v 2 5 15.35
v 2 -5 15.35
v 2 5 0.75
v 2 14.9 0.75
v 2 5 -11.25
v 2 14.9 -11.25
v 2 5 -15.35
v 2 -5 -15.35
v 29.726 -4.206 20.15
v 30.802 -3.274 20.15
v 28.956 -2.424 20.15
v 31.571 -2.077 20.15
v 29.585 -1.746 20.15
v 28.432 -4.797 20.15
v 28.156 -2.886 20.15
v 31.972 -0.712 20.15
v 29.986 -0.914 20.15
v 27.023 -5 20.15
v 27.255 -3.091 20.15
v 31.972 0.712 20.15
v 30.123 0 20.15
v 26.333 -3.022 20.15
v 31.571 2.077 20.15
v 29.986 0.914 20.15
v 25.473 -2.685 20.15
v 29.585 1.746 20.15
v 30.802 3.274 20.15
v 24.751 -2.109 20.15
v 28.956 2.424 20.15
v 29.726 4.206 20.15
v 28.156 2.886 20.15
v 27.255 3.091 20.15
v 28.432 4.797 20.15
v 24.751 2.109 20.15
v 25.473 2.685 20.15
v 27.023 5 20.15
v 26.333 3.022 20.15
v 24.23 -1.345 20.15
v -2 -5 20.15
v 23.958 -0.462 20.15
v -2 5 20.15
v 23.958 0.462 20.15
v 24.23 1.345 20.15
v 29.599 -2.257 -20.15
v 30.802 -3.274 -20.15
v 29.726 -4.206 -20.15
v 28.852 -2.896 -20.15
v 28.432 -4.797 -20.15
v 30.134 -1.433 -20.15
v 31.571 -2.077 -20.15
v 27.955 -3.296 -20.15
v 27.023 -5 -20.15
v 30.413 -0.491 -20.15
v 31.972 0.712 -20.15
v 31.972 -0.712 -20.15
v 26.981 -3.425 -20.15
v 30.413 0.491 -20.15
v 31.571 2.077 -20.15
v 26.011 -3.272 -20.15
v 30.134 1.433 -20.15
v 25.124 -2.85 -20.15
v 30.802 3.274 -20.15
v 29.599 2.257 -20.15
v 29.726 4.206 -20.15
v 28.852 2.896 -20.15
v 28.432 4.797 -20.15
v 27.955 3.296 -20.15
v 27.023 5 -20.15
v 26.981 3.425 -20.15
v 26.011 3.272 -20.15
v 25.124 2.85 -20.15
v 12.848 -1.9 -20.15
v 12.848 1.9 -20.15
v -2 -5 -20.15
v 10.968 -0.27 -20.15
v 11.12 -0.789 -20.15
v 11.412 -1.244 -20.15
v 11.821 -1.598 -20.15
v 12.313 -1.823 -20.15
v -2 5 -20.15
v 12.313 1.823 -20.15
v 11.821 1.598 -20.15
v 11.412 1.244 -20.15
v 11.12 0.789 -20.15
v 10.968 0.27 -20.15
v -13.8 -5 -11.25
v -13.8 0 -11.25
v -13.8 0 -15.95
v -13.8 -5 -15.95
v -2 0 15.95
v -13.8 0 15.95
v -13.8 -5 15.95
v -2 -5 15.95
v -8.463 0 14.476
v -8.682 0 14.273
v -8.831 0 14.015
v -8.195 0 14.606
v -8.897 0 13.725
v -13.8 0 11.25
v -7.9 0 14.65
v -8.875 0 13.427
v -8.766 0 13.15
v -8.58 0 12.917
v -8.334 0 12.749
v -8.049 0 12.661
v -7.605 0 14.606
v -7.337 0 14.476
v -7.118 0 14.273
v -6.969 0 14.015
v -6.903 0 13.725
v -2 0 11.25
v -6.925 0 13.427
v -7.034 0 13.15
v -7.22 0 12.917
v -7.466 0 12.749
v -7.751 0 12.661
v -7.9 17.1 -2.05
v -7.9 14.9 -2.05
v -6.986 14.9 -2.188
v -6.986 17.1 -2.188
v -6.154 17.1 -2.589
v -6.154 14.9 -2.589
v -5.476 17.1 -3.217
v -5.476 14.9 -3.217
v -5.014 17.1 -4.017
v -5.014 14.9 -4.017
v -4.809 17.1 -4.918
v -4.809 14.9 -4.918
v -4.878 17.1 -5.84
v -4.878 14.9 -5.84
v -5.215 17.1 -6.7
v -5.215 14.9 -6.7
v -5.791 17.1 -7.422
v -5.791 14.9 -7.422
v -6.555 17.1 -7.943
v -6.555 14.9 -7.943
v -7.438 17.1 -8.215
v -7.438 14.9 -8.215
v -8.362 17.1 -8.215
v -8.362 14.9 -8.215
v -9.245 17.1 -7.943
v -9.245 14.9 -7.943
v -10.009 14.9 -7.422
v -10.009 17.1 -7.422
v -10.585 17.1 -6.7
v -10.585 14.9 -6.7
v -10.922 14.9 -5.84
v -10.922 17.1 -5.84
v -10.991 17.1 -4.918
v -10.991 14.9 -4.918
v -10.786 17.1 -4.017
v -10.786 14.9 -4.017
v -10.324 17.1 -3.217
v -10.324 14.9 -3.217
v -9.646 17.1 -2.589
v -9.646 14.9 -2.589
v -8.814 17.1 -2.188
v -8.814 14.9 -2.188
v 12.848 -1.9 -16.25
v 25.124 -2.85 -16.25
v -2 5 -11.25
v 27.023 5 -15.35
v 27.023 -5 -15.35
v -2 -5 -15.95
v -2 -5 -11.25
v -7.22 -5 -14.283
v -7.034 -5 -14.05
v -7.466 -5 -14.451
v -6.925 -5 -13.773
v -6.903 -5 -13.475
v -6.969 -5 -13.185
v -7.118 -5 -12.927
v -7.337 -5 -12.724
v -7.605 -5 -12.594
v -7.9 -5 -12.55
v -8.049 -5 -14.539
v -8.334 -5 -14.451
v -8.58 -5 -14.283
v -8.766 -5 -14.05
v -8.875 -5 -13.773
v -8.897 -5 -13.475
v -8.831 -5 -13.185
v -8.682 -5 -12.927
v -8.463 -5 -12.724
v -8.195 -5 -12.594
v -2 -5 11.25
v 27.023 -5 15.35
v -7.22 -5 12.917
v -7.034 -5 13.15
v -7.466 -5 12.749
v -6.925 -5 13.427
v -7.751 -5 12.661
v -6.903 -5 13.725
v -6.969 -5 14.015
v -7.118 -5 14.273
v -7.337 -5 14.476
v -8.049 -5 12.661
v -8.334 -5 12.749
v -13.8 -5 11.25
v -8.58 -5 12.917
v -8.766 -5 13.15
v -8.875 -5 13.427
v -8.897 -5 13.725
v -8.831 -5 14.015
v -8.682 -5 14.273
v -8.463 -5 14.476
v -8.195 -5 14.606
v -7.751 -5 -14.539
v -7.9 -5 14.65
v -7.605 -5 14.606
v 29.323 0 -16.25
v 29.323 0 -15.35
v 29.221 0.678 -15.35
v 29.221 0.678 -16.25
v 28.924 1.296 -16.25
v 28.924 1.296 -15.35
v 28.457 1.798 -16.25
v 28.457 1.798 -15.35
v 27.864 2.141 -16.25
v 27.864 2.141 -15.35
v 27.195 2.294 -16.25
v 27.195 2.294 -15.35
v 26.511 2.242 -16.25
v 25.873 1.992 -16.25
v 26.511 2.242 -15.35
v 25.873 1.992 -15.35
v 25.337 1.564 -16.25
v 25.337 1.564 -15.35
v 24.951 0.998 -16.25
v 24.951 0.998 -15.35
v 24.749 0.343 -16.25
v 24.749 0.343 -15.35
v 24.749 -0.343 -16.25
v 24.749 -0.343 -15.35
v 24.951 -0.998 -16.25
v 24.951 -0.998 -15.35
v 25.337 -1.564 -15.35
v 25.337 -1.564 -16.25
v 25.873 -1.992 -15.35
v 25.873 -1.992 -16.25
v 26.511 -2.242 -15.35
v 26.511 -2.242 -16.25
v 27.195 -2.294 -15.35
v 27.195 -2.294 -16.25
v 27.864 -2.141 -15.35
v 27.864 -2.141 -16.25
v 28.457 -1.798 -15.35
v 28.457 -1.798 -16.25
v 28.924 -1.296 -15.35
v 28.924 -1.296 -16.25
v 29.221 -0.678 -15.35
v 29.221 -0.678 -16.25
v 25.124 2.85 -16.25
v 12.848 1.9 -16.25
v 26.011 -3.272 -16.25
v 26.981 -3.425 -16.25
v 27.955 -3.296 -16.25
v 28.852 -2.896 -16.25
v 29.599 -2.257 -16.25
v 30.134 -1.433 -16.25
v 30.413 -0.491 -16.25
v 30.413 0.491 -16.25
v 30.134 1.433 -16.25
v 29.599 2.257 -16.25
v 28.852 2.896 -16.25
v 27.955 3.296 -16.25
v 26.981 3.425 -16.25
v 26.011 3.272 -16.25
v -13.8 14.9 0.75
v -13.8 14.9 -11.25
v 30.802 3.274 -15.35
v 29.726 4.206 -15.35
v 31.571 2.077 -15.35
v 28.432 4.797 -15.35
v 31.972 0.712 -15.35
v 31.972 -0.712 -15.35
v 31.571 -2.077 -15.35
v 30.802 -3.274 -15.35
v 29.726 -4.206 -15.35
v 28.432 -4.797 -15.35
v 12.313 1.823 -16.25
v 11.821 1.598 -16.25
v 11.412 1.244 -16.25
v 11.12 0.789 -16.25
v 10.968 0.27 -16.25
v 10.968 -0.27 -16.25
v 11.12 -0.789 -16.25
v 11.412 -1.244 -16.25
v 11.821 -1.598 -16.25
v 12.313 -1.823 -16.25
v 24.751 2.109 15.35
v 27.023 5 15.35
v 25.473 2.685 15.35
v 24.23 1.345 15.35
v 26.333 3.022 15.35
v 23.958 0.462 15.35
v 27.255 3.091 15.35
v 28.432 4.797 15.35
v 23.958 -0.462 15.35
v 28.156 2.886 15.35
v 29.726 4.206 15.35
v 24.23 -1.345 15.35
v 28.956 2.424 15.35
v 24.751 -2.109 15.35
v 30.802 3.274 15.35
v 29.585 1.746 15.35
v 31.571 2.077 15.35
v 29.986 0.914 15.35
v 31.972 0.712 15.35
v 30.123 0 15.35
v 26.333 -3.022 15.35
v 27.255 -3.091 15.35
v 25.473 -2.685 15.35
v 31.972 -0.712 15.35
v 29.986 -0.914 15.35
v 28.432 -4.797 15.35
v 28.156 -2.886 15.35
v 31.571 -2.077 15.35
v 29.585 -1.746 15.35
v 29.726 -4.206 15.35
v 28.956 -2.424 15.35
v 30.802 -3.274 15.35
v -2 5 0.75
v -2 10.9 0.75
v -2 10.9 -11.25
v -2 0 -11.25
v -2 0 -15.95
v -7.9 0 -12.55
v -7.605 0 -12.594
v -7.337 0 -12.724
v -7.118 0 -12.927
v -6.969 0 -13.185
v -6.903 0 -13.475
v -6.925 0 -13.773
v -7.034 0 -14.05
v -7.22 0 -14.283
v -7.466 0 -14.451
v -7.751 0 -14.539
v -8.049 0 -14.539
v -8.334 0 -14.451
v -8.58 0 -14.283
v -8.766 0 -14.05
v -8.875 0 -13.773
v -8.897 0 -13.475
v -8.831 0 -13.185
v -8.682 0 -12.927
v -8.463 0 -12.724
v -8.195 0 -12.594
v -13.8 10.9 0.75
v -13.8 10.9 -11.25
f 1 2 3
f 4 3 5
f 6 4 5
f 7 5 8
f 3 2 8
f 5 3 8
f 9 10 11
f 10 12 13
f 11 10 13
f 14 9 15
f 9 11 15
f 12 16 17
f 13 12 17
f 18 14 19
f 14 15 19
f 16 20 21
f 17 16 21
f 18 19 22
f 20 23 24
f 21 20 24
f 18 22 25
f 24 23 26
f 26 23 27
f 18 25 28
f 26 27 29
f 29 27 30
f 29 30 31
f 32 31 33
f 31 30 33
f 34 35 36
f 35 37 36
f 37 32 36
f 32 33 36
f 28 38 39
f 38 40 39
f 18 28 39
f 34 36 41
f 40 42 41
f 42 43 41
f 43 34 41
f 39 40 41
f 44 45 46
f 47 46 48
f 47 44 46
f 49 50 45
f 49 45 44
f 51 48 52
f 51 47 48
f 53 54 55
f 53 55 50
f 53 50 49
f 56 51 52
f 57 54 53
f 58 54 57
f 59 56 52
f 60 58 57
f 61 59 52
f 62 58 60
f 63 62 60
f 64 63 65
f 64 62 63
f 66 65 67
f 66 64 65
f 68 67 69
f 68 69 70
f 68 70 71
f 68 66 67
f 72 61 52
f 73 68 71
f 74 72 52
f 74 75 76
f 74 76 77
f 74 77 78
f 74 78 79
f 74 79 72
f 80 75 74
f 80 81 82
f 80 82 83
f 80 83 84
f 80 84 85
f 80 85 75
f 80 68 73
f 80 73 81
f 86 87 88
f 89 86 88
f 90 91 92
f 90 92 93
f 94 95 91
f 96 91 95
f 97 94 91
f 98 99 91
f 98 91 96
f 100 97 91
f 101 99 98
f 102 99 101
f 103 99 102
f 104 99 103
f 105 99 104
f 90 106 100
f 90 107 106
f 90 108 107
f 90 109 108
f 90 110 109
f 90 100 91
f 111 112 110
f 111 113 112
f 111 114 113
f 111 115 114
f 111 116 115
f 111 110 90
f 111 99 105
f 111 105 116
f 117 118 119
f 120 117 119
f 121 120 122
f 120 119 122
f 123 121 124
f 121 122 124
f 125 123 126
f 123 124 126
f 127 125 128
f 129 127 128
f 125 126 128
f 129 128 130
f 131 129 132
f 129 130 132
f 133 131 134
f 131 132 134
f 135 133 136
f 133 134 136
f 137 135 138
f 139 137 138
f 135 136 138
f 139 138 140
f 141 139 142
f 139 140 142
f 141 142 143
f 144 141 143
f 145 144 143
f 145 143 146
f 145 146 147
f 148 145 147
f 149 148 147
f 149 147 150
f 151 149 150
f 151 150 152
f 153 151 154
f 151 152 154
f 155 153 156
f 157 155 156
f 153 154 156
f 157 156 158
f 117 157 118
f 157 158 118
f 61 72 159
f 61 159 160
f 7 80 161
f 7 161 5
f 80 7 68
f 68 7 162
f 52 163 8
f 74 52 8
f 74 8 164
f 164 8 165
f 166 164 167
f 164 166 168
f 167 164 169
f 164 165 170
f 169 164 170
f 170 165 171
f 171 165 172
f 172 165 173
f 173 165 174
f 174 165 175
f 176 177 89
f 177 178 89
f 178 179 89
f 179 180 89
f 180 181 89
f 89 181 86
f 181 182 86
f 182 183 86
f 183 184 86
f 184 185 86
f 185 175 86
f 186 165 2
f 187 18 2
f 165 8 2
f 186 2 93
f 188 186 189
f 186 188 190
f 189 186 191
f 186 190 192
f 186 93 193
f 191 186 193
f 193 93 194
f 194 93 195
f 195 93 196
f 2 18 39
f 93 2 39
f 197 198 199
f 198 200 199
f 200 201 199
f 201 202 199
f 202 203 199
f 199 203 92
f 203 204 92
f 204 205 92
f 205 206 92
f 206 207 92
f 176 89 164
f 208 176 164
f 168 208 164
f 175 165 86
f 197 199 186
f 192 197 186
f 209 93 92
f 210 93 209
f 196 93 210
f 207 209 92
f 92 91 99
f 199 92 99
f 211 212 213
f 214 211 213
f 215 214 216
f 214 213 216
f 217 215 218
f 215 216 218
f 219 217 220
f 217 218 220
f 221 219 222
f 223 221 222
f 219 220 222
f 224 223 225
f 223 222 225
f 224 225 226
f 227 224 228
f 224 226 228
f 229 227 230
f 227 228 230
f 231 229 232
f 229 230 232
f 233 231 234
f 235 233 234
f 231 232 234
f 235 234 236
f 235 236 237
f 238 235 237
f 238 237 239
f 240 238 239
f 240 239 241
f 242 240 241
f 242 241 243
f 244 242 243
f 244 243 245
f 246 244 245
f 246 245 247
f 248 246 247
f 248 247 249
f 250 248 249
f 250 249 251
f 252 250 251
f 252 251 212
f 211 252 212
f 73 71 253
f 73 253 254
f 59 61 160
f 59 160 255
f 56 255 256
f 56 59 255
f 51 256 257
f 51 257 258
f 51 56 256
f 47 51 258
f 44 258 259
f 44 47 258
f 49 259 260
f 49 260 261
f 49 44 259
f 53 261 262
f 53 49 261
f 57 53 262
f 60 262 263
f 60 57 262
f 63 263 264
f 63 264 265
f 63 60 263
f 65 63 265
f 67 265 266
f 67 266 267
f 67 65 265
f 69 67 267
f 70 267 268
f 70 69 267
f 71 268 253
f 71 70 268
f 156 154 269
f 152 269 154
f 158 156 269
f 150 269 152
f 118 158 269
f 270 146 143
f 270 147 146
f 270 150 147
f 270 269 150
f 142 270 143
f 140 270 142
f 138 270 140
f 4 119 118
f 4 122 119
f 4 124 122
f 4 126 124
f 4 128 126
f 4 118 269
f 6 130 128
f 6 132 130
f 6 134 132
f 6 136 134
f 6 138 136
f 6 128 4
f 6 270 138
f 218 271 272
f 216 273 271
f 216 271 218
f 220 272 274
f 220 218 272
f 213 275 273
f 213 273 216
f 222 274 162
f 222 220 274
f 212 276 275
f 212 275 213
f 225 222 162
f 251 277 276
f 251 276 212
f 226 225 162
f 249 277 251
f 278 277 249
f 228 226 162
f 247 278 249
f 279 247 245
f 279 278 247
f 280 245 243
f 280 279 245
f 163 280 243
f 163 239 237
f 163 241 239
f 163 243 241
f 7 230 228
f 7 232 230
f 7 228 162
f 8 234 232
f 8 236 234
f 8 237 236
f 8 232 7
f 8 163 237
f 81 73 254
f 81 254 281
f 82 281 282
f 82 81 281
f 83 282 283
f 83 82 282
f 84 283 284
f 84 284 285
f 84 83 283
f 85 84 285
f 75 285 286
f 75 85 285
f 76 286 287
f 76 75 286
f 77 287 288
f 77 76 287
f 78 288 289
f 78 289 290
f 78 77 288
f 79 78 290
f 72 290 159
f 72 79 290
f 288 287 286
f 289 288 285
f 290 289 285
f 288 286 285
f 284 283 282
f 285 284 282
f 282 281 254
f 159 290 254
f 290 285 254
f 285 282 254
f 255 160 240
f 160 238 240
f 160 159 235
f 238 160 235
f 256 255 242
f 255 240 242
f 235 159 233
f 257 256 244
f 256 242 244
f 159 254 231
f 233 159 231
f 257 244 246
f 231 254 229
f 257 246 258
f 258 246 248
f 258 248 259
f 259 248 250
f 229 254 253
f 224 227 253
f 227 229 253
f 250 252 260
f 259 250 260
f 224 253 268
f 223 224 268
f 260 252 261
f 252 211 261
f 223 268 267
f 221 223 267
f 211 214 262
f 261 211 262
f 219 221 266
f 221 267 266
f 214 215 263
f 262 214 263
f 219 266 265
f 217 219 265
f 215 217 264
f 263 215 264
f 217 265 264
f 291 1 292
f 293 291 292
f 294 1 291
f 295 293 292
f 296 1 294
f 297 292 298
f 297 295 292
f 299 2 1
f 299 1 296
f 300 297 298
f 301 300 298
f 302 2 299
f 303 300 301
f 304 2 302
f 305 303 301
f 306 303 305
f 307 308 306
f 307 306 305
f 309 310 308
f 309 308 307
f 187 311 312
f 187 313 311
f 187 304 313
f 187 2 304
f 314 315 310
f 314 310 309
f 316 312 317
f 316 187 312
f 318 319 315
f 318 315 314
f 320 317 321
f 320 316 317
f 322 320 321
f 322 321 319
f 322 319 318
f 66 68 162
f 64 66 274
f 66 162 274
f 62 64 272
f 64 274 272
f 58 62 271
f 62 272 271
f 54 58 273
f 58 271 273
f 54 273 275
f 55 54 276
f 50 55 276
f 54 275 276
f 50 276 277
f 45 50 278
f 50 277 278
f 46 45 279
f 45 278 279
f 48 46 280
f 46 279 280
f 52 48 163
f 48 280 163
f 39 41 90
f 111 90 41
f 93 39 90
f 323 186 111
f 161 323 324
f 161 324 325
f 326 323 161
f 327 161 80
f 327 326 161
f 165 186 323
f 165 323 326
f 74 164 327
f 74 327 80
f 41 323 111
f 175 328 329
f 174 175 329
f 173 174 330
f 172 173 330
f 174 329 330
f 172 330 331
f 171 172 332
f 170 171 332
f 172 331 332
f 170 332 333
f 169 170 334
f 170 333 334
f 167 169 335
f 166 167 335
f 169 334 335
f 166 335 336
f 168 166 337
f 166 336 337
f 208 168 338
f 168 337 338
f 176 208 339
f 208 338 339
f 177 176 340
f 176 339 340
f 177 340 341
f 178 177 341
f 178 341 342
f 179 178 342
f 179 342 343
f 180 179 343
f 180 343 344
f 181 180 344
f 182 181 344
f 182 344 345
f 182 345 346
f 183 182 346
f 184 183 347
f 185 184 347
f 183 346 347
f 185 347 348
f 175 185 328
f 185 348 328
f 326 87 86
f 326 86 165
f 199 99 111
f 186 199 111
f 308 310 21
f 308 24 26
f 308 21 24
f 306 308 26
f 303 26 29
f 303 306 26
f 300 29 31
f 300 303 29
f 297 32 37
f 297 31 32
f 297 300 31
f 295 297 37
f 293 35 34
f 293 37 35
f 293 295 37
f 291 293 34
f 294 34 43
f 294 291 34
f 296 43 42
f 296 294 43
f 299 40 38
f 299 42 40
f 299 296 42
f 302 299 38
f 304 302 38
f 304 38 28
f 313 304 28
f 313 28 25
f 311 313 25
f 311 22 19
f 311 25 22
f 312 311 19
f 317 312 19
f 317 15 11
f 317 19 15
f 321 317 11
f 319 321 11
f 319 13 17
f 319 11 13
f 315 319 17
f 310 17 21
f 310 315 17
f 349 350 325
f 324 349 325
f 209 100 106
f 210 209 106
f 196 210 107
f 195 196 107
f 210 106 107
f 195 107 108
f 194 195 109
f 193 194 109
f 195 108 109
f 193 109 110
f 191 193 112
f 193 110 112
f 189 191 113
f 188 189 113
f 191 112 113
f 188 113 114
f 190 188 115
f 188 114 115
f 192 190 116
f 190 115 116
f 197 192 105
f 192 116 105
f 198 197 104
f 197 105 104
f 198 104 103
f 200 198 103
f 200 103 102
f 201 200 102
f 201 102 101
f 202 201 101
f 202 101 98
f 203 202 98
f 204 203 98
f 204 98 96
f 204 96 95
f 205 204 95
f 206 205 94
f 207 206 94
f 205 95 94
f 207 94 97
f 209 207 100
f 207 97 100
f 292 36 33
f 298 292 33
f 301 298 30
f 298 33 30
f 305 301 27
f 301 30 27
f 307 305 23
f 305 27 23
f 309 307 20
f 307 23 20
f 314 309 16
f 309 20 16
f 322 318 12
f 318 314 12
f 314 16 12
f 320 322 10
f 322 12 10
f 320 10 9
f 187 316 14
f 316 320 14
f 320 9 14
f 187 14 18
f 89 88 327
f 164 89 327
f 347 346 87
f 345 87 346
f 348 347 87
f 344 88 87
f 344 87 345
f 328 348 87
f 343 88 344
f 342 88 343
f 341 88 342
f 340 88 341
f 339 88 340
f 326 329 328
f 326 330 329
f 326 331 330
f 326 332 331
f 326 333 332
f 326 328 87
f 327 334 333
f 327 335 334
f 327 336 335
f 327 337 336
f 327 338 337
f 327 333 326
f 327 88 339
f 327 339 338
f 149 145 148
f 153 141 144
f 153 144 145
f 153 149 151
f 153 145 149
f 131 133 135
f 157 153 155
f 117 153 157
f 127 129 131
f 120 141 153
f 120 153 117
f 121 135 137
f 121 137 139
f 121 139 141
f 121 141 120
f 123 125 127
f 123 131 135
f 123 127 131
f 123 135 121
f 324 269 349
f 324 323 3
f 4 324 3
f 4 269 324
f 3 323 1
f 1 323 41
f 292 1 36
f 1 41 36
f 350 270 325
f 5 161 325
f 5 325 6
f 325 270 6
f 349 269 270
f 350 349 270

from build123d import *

# Parameters (mm, degrees)
BOSS_EXTRUDE1_DEPTH     = 20.15
CUT_EXTRUDE1_DEPTH      = 40.134529676
CUT_EXTRUDE1_DEPTH_BACK = 40.134529676
CUT_EXTRUDE2_START      = -40.3
CUT_EXTRUDE2_DEPTH      = 3.9
SKETCH5_R               = 2.3
CUT_EXTRUDE3_DEPTH      = 39.164268799
SKETCH6_R               = 3.1
CUT_EXTRUDE4_DEPTH      = 39.164268799
SKETCH7_W               = 11.8
SKETCH7_H               = 4.7
SKETCH7_R               = 1
BOSS_EXTRUDE2_DEPTH     = 5
SKETCH8_W               = 4
SKETCH8_H               = 12
BOSS_EXTRUDE3_DEPTH     = 9.9
SKETCH8_2_W             = 4
SKETCH8_2_H             = 12
BOSS_EXTRUDE4_DEPTH     = 9.9
SKETCH9_W               = 11.8
SKETCH9_H               = 12
BOSS_EXTRUDE5_DEPTH     = 4
SKETCH10_R              = 3.1
BOSS_EXTRUDE6_DEPTH     = 2.2


with BuildPart() as part:
    # Sketch1 → Boss-Extrude1 (new, symmetric)
    with BuildSketch(Plane.XY):
        with BuildLine():
            Line((-27.023255814, 5), (27.023255814, 5))
            ThreePointArc((27.023255814, 5), (32.023255814, 0), (27.023255814, -5))
            Line((27.023255814, -5), (-27.023255814, -5))
            ThreePointArc((-27.023255814, -5), (-32.023255814, 0), (-27.023255814, 5))
        make_face()
    extrude(amount=BOSS_EXTRUDE1_DEPTH, both=True)

    # Sketch2 → Cut-Extrude1 (cut, two sides: drawn at the far end of the back side and taken through both)
    with BuildSketch(Plane(origin=(0, 5, 0), x_dir=(1, 0, 0), z_dir=(0, 1, 0)).offset(-CUT_EXTRUDE1_DEPTH_BACK)):
        Polygon((-2, -20.15), (-2, 20.15), (-27.023255814, 20.15), (-37.952019542, 20.15), (-37.952019542, -20.15), (-27.023255814, -20.15), align=None)
        Polygon((27.023255814, 15.35), (38.05829872, 15.35), (38.05829872, -15.35), (27.023255814, -15.35), (2, -15.35), (2, 15.35), align=None)
    extrude(amount=CUT_EXTRUDE1_DEPTH + CUT_EXTRUDE1_DEPTH_BACK, mode=Mode.SUBTRACT)

    # Sketch4 → Cut-Extrude2 (cut)
    with BuildSketch(Plane.XY.offset(20.15).offset(CUT_EXTRUDE2_START)):
        with BuildLine():
            Line((25.123749299, 2.85), (12.848255814, 1.9))
            ThreePointArc((12.848255814, 1.9), (10.948255814, 0), (12.848255814, -1.9))
            Line((12.848255814, -1.9), (25.123749299, -2.85))
            ThreePointArc((25.123749299, -2.85), (30.448255814, 0), (25.123749299, 2.85))
        make_face()
    extrude(amount=CUT_EXTRUDE2_DEPTH, mode=Mode.SUBTRACT)

    # Sketch5 → Cut-Extrude3 (cut, through all)
    with BuildSketch(Plane.XY):
        with Locations((27.023255814, 0)):
            Circle(SKETCH5_R)
    extrude(amount=-CUT_EXTRUDE3_DEPTH, mode=Mode.SUBTRACT)

    # Sketch6 → Cut-Extrude4 (cut, through all)
    with BuildSketch(Plane.XY):
        with Locations((27.023255814, 0)):
            Circle(SKETCH6_R)
    extrude(amount=CUT_EXTRUDE4_DEPTH, mode=Mode.SUBTRACT)

    # Sketch7 → Boss-Extrude2 (add)
    # profile 1 of 2: a face of its own
    with BuildSketch(Plane(origin=(0, 0, 0), x_dir=(1, 0, 0), z_dir=(0, 1, 0))):
        with Locations((-7.9, 13.6)):
            Rectangle(SKETCH7_W, SKETCH7_H)
        with Locations(Location((-7.9, 13.55, 0), (0, 0, 270))):
            Circle(SKETCH7_R, mode=Mode.SUBTRACT)
    # profile 2 of 2: a face of its own
    with BuildSketch(Plane(origin=(0, 0, 0), x_dir=(1, 0, 0), z_dir=(0, 1, 0))):
        with Locations((-7.9, -13.6)):
            Rectangle(SKETCH7_W, SKETCH7_H)
        with Locations(Location((-7.9, -13.65, 0), (0, 0, 270))):
            Circle(SKETCH7_R, mode=Mode.SUBTRACT)
    extrude(amount=-BOSS_EXTRUDE2_DEPTH)

    # Sketch8 → Boss-Extrude3 (add)
    with BuildSketch(Plane(origin=(0, 5, 0), x_dir=(1, 0, 0), z_dir=(0, 1, 0))):
        with Locations((0, 5.25)):
            Rectangle(SKETCH8_W, SKETCH8_H)
    extrude(amount=BOSS_EXTRUDE3_DEPTH)

    # Sketch8<2> → Boss-Extrude4 (add)
    with BuildSketch(Plane(origin=(0, 5, 0), x_dir=(1, 0, 0), z_dir=(0, 1, 0))):
        with Locations((0, 5.25)):
            Rectangle(SKETCH8_2_W, SKETCH8_2_H)
    extrude(amount=BOSS_EXTRUDE4_DEPTH)

    # Sketch9 → Boss-Extrude5 (add)
    with BuildSketch(Plane(origin=(0, 14.9, 0), x_dir=(1, 0, 0), z_dir=(0, 1, 0))):
        with Locations((-7.9, 5.25)):
            Rectangle(SKETCH9_W, SKETCH9_H)
    extrude(amount=-BOSS_EXTRUDE5_DEPTH)

    # Sketch10 → Boss-Extrude6 (add)
    with BuildSketch(Plane(origin=(0, 14.9, 0), x_dir=(1, 0, 0), z_dir=(0, 1, 0))):
        with Locations(Location((-7.9, 5.15, 0), (0, 0, 270))):
            Circle(SKETCH10_R)
    extrude(amount=BOSS_EXTRUDE6_DEPTH)


solid = part.part
